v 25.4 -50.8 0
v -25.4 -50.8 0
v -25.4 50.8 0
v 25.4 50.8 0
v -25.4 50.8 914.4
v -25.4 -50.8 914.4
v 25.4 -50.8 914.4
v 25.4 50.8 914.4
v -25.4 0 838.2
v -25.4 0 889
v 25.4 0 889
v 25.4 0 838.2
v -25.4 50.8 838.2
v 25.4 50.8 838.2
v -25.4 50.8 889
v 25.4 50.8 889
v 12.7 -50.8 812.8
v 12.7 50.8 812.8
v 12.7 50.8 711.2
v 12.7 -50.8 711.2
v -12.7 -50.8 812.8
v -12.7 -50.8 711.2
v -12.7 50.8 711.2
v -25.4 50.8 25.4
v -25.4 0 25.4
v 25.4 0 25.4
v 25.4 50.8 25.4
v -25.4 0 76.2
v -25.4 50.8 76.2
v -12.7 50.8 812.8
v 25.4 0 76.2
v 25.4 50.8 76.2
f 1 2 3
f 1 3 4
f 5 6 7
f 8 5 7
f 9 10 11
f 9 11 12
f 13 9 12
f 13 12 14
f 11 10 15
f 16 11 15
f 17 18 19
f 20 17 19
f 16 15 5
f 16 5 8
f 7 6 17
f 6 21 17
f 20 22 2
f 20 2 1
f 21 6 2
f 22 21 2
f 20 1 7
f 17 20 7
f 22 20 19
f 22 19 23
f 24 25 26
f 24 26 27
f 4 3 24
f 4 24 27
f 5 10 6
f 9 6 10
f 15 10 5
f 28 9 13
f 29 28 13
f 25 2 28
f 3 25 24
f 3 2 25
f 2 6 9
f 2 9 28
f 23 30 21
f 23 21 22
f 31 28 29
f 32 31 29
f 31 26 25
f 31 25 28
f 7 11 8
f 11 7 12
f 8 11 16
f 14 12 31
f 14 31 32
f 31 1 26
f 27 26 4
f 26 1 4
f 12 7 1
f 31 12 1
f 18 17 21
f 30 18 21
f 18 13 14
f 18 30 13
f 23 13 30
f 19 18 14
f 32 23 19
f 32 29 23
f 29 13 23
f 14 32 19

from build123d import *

# Parameters (mm, degrees)
SKETCH1_W           = 50.8
SKETCH1_H           = 101.6
BOSS_EXTRUDE1_DEPTH = 914.4
SKETCH2_W           = 50.8
SKETCH2_H           = 50.8
CUT_EXTRUDE1_DEPTH  = 918.217880332
SKETCH3_W           = 25.4
SKETCH3_H           = 101.6
CUT_EXTRUDE2_DEPTH  = 921.377683345


with BuildPart() as part:
    # Sketch1 → Boss-Extrude1 (new body)
    with BuildSketch(Plane.XY):
        Rectangle(SKETCH1_W, SKETCH1_H)
    extrude(amount=BOSS_EXTRUDE1_DEPTH)

    # Sketch2 → Cut-Extrude1 (cut, symmetric)
    with BuildSketch(Plane(origin=(25.4, 0, 0), x_dir=(0, 0, -1), z_dir=(1, 0, 0))):
        with Locations((304.8, 25.4)):
            Rectangle(SKETCH2_W, SKETCH2_H)
        with Locations((-863.6, 25.4)):
            Rectangle(SKETCH2_W, SKETCH2_H)
        with Locations((1473.2, 25.4)):
            Rectangle(SKETCH2_W, SKETCH2_H)
    cut_extrude1 = extrude(amount=CUT_EXTRUDE1_DEPTH, both=True, mode=Mode.SUBTRACT)

    # Mirror1: Cut-Extrude1 across plane
    add(cut_extrude1.mirror(Plane.XY.offset(457.2)), mode=Mode.SUBTRACT)

    # Sketch3 → Cut-Extrude2 (cut, through all)
    with BuildSketch(Plane(origin=(0, -50.8, 0), x_dir=(-1, 0, 0), z_dir=(0, -1, 0))):
        with Locations((0, -762)):
            Rectangle(SKETCH3_W, SKETCH3_H)
    extrude(amount=-CUT_EXTRUDE2_DEPTH, mode=Mode.SUBTRACT)


solid = part.part
